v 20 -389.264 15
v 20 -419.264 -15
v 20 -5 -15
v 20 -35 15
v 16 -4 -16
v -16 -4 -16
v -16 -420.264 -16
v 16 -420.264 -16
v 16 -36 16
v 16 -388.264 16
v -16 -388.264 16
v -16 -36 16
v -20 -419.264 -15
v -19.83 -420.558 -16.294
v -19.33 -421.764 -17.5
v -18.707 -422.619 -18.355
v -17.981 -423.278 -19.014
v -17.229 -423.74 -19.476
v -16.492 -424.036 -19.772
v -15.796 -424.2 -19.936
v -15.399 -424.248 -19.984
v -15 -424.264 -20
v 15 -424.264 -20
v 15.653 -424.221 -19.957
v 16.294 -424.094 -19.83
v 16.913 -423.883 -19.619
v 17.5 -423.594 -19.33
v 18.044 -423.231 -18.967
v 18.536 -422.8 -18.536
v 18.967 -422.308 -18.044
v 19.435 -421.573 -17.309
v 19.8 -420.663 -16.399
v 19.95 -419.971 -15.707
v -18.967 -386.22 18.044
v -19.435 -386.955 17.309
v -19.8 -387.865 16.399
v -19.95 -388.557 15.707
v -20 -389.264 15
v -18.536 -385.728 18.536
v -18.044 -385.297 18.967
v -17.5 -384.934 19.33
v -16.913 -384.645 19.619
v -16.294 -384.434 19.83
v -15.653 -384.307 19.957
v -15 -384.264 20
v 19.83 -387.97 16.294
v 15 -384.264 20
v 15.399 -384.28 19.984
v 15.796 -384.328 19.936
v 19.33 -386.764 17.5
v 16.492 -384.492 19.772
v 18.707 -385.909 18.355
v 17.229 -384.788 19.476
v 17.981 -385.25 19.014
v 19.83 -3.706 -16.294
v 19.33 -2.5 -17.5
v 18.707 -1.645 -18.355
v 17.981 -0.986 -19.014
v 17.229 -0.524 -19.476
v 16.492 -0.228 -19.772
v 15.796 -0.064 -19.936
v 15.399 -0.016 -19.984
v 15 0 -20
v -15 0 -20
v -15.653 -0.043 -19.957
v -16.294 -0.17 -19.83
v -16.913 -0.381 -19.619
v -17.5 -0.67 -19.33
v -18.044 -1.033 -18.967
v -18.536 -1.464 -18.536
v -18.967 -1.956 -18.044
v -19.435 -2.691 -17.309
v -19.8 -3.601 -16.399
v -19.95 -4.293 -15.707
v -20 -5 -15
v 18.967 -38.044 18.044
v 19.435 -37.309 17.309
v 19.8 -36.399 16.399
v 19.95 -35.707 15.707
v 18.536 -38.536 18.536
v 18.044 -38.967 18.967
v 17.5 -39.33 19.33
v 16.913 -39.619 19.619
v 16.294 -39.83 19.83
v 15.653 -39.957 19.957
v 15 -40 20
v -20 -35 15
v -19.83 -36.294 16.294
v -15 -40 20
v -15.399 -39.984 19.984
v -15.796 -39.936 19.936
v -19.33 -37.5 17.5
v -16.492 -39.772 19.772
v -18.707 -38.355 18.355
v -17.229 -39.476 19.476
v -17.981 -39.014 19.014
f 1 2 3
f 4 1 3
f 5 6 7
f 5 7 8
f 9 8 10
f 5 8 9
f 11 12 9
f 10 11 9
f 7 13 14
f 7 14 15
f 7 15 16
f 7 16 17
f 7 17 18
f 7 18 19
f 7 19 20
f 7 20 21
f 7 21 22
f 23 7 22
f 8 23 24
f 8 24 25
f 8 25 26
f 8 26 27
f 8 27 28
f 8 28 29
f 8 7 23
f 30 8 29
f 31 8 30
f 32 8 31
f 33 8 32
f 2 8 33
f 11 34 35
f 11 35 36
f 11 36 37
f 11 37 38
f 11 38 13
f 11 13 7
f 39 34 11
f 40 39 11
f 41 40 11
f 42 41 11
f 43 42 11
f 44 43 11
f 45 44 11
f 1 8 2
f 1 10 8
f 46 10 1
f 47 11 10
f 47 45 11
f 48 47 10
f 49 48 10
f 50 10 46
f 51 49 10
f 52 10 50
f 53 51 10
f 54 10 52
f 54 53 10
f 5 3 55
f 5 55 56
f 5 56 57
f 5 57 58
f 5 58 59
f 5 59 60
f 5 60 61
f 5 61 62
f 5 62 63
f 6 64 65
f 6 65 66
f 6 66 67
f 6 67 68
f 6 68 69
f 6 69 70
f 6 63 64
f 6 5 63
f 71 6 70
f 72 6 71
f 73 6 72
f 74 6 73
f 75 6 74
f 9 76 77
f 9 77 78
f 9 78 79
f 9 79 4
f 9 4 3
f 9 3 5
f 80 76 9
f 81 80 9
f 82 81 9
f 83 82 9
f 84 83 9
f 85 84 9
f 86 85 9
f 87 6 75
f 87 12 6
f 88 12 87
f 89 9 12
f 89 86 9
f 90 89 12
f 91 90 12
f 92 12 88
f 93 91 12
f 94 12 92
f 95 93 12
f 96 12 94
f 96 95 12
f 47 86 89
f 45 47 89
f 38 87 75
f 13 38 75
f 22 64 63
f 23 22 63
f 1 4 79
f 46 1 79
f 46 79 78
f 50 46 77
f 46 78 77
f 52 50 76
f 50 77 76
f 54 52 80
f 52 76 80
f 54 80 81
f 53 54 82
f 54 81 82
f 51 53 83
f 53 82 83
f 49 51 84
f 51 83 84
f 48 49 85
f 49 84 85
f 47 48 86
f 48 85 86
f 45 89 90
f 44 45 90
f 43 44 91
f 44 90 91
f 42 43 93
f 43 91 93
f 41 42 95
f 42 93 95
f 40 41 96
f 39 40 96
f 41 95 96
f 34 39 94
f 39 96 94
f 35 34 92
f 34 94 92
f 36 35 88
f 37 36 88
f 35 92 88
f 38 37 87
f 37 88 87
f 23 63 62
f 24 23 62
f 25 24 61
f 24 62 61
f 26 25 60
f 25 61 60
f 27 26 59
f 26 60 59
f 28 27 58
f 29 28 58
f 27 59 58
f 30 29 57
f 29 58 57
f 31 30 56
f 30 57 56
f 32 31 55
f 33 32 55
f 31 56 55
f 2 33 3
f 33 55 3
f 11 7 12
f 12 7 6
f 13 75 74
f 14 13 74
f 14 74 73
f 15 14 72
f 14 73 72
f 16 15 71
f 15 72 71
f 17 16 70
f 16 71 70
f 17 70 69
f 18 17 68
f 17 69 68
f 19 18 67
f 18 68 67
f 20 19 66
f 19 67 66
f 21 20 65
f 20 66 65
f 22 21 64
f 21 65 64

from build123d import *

# Parameters (mm, degrees)
F0_W     = 32
F0_H     = 32
F1_DEPTH = 424.264
F2_W     = 32
F2_H     = 32
F3_ANGLE = 45
F4_W     = 32
F4_H     = 32
F5_ANGLE = 45


with BuildPart() as f1:
    # F0 (on Front) → F1 (new body)
    with BuildSketch(Plane.XZ):
        with BuildLine():
            Line((-15, -20), (15, -20))
            ThreePointArc((15, -20), (18.5355339059, -18.5355339059), (20, -15))
            Line((20, -15), (20, 15))
            ThreePointArc((20, 15), (18.5355339059, 18.5355339059), (15, 20))
            Line((15, 20), (-15, 20))
            ThreePointArc((-15, 20), (-18.5355339059, 18.5355339059), (-20, 15))
            Line((-20, 15), (-20, -15))
            ThreePointArc((-20, -15), (-18.5355339059, -18.5355339059), (-15, -20))
        make_face()
        Rectangle(F0_W, F0_H, mode=Mode.SUBTRACT)
    extrude(amount=F1_DEPTH)

    # F2 (on face) → F3 (revolve, cut)
    with BuildSketch(Plane.XZ.offset(424.264)):
        with BuildLine():
            Line((-15, -20), (15, -20))
            ThreePointArc((15, -20), (18.5355339059, -18.5355339059), (20, -15))
            Line((20, -15), (20, 15))
            ThreePointArc((20, 15), (18.5355339059, 18.5355339059), (15, 20))
            Line((15, 20), (-15, 20))
            ThreePointArc((-15, 20), (-18.5355339059, 18.5355339059), (-20, 15))
            Line((-20, 15), (-20, -15))
            ThreePointArc((-20, -15), (-18.5355339059, -18.5355339059), (-15, -20))
        make_face()
        Rectangle(F2_W, F2_H, mode=Mode.SUBTRACT)
        with BuildLine():
            ThreePointArc((15, 20), (18.5355339059, 18.5355339059), (20, 15))
            Line((20, 15), (20, 20))
            Line((20, 20), (15, 20))
        make_face()
        with BuildLine():
            Line((-20, 20), (-20, 15))
            ThreePointArc((-20, 15), (-18.5355339059, 18.5355339059), (-15, 20))
            Line((-15, 20), (-20, 20))
        make_face()
        with BuildLine():
            Line((15, -20), (20, -20))
            Line((20, -20), (20, -15))
            ThreePointArc((20, -15), (18.5355339059, -18.5355339059), (15, -20))
        make_face()
        Rectangle(F2_W, F2_H)
        Polygon((15, 20), (20, 20), (20, 37), (-20, 37), (-20, 20), (-15, 20), align=None)
        with BuildLine():
            Line((-20, -20), (-15, -20))
            ThreePointArc((-15, -20), (-18.5355339059, -18.5355339059), (-20, -15))
            Line((-20, -15), (-20, -20))
        make_face()
    revolve(axis=Axis((0, -424.264, -20), (-1, 0, 0)), revolution_arc=F3_ANGLE, mode=Mode.SUBTRACT)

    # F4 (on face) → F5 (revolve, cut)
    with BuildSketch(Plane(origin=(0, 0, 0), x_dir=(-1, 0, 0), z_dir=(0, 1, 0))):
        with BuildLine():
            ThreePointArc((-20, -15), (-18.5355339059, -18.5355339059), (-15, -20))
            Line((-15, -20), (15, -20))
            ThreePointArc((15, -20), (18.5355339059, -18.5355339059), (20, -15))
            Line((20, -15), (20, 15))
            ThreePointArc((20, 15), (18.5355339059, 18.5355339059), (15, 20))
            Line((15, 20), (-15, 20))
            ThreePointArc((-15, 20), (-18.5355339059, 18.5355339059), (-20, 15))
            Line((-20, 15), (-20, -15))
        make_face()
        Rectangle(F4_W, F4_H, mode=Mode.SUBTRACT)
        Rectangle(F4_W, F4_H)
        with BuildLine():
            Line((-20, 37), (-20, 15))
            ThreePointArc((-20, 15), (-18.5355339059, 18.5355339059), (-15, 20))
            Line((-15, 20), (15, 20))
            ThreePointArc((15, 20), (18.5355339059, 18.5355339059), (20, 15))
            Line((20, 15), (20, 37))
            Line((20, 37), (-20, 37))
        make_face()
        with BuildLine():
            ThreePointArc((20, -15), (18.5355339059, -18.5355339059), (15, -20))
            Line((15, -20), (20, -20))
            Line((20, -20), (20, -15))
        make_face()
        with BuildLine():
            Line((-20, -15), (-20, -20))
            Line((-20, -20), (-15, -20))
            ThreePointArc((-15, -20), (-18.5355339059, -18.5355339059), (-20, -15))
        make_face()
    revolve(axis=Axis((0, 0, -20), (1, 0, 0)), revolution_arc=F5_ANGLE, mode=Mode.SUBTRACT)


solid = f1.part
